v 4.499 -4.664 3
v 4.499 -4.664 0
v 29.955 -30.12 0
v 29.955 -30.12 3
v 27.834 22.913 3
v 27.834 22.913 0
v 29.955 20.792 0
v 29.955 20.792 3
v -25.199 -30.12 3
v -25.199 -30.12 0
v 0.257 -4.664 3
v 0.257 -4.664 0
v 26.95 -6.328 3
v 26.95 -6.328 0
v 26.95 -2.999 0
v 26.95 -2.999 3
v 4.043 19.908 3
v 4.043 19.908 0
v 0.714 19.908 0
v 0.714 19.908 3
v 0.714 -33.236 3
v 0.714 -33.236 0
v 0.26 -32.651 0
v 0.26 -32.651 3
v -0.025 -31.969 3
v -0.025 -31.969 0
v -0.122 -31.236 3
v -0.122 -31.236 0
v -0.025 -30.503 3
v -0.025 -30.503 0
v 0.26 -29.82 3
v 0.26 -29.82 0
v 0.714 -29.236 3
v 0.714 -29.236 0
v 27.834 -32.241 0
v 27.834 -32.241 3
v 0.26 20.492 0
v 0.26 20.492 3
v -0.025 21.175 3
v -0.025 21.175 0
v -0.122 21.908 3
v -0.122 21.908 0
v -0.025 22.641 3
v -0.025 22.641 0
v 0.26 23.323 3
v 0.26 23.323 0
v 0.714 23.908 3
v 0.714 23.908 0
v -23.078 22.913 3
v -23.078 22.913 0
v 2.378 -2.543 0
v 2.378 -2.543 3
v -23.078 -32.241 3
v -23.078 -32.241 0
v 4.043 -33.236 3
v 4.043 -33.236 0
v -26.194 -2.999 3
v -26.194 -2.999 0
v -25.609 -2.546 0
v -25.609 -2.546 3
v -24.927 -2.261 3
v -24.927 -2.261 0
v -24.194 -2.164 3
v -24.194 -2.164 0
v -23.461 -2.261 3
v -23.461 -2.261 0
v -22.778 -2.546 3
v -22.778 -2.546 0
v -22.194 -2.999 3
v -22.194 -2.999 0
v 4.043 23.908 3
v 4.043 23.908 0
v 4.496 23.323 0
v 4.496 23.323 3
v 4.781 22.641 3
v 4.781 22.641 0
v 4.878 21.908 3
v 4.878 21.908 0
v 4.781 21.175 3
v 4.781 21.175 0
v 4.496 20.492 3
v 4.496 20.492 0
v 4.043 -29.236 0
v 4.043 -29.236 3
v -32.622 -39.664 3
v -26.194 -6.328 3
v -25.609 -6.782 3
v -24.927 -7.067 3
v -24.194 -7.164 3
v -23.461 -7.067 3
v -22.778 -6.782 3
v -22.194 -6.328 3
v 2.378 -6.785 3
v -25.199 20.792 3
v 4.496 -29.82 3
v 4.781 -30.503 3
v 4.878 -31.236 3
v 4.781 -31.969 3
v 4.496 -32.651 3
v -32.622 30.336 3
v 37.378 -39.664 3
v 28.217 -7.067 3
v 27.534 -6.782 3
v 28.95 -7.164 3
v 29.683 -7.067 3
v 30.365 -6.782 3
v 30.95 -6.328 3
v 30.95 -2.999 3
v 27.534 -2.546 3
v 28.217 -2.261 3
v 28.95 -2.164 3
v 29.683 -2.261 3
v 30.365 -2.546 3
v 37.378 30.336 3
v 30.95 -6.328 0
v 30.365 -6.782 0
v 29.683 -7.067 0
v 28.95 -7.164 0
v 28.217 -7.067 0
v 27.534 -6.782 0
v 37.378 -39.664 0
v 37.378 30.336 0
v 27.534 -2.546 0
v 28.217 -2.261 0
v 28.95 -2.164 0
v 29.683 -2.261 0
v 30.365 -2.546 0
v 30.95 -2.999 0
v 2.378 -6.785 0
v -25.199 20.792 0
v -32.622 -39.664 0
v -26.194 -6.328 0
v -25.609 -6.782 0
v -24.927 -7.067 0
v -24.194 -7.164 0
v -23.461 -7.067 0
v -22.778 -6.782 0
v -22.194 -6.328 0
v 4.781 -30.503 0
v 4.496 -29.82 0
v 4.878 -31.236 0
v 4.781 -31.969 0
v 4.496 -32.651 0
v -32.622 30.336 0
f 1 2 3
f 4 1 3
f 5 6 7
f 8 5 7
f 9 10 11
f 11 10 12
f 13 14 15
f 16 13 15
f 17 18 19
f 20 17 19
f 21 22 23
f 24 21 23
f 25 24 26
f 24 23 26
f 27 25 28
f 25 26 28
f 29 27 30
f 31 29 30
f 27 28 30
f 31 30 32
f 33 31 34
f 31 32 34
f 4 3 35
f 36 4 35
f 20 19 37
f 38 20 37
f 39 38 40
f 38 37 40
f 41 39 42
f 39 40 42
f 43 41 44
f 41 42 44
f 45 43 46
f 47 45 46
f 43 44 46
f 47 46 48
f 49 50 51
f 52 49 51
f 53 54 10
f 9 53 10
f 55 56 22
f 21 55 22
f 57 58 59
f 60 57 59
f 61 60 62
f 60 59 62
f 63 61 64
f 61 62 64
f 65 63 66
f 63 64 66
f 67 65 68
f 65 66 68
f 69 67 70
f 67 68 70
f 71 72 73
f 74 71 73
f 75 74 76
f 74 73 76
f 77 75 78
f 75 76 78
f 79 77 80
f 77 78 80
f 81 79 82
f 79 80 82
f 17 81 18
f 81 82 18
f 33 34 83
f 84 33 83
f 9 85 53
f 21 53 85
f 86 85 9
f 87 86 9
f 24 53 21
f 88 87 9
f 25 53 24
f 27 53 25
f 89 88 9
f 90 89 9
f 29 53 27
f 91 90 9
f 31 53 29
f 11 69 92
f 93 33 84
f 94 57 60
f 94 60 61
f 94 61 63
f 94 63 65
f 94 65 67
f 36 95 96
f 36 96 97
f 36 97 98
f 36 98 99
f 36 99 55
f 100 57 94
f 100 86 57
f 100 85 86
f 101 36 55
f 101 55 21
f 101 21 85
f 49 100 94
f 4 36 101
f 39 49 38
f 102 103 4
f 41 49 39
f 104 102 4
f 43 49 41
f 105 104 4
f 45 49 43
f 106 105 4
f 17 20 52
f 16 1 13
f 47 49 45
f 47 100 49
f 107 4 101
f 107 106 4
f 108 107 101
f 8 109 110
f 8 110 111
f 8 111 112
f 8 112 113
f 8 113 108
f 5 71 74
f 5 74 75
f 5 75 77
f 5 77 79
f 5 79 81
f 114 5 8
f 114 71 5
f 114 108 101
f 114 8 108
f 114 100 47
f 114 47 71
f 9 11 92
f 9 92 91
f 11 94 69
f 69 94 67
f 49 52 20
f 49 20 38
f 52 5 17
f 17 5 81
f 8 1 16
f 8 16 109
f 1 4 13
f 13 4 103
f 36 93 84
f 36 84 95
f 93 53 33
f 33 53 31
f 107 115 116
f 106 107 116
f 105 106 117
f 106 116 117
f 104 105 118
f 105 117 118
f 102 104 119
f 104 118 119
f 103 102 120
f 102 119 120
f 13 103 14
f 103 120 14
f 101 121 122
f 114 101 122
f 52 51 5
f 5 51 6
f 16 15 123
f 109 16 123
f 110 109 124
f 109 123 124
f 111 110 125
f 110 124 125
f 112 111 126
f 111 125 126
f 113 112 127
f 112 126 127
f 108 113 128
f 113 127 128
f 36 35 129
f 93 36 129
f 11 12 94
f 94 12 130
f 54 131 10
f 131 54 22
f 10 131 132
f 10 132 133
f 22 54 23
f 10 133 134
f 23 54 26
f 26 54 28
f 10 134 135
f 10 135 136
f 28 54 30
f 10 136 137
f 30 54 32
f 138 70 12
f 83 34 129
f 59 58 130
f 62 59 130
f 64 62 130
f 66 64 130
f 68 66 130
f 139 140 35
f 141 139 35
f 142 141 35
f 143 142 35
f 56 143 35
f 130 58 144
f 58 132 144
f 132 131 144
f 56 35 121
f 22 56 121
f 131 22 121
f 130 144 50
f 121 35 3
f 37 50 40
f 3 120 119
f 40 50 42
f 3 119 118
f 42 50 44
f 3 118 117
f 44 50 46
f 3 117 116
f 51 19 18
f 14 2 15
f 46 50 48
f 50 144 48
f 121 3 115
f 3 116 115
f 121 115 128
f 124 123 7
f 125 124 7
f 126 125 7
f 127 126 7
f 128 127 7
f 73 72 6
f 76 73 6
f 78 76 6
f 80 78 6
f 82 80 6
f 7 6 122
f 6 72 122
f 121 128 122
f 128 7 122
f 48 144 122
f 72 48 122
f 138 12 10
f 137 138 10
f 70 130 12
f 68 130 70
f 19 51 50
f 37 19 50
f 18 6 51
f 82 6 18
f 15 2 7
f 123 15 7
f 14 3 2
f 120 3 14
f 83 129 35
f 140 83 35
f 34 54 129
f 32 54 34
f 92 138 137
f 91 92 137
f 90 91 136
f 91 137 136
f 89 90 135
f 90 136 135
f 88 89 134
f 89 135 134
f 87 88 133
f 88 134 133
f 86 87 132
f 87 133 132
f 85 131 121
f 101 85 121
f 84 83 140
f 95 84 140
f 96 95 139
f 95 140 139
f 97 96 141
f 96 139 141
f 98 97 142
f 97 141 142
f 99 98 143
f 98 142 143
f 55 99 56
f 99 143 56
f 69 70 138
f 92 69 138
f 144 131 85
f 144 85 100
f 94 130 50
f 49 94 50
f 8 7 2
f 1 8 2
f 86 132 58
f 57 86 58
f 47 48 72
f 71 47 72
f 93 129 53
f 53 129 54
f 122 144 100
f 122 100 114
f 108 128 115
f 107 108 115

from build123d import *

# Parameters (mm, degrees)
ESBO_O1_W                = 70
ESBO_O1_H                = 70
RESSALTO_EXTRUS_O2_DEPTH = 3


with BuildPart() as part:
    # Esboço1 → Ressalto-extrusão2 (new body)
    with BuildSketch(Plane.XY):
        with Locations((2.378031716, -4.663986286)):
            Rectangle(ESBO_O1_W, ESBO_O1_H)
        with BuildLine():
            ThreePointArc((-26.193742937, -2.999482116), (-24.193742937, -2.163986286), (-22.193742937, -2.999482116))
            Line((-22.193742937, -2.999482116), (-22.193742937, -6.328490456))
            ThreePointArc((-22.193742937, -6.328490456), (-24.193742937, -7.163986286), (-26.193742937, -6.328490456))
            Line((-26.193742937, -6.328490456), (-26.193742937, -2.999482116))
        make_face(mode=Mode.SUBTRACT)
        with BuildLine():
            Line((4.042535886, -33.235760939), (0.713527546, -33.235760939))
            ThreePointArc((0.713527546, -33.235760939), (-0.121968284, -31.235760939), (0.713527546, -29.235760939))
            Line((0.713527546, -29.235760939), (4.042535886, -29.235760939))
            ThreePointArc((4.042535886, -29.235760939), (4.878031716, -31.235760939), (4.042535886, -33.235760939))
        make_face(mode=Mode.SUBTRACT)
        Polygon((0.256711372, -4.663986286), (-25.19913275, 20.791857837), (-23.077812407, 22.91317818), (2.378031716, -2.542665942), (27.833875839, 22.91317818), (29.955196182, 20.791857837), (4.499352059, -4.663986286), (29.955196182, -30.119830409), (27.833875839, -32.241150752), (2.378031716, -6.78530663), (-23.077812407, -32.241150752), (-25.19913275, -30.119830409), align=None, mode=Mode.SUBTRACT)
        with BuildLine():
            Line((26.949806369, -6.328490456), (26.949806369, -2.999482116))
            ThreePointArc((26.949806369, -2.999482116), (28.949806369, -2.163986286), (30.949806369, -2.999482116))
            Line((30.949806369, -2.999482116), (30.949806369, -6.328490456))
            ThreePointArc((30.949806369, -6.328490456), (28.949806369, -7.163986286), (26.949806369, -6.328490456))
        make_face(mode=Mode.SUBTRACT)
        with BuildLine():
            ThreePointArc((0.713527546, 19.907788367), (-0.121968284, 21.907788367), (0.713527546, 23.907788367))
            Line((0.713527546, 23.907788367), (4.042535886, 23.907788367))
            ThreePointArc((4.042535886, 23.907788367), (4.878031716, 21.907788367), (4.042535886, 19.907788367))
            Line((4.042535886, 19.907788367), (0.713527546, 19.907788367))
        make_face(mode=Mode.SUBTRACT)
    extrude(amount=RESSALTO_EXTRUS_O2_DEPTH)


solid = part.part
